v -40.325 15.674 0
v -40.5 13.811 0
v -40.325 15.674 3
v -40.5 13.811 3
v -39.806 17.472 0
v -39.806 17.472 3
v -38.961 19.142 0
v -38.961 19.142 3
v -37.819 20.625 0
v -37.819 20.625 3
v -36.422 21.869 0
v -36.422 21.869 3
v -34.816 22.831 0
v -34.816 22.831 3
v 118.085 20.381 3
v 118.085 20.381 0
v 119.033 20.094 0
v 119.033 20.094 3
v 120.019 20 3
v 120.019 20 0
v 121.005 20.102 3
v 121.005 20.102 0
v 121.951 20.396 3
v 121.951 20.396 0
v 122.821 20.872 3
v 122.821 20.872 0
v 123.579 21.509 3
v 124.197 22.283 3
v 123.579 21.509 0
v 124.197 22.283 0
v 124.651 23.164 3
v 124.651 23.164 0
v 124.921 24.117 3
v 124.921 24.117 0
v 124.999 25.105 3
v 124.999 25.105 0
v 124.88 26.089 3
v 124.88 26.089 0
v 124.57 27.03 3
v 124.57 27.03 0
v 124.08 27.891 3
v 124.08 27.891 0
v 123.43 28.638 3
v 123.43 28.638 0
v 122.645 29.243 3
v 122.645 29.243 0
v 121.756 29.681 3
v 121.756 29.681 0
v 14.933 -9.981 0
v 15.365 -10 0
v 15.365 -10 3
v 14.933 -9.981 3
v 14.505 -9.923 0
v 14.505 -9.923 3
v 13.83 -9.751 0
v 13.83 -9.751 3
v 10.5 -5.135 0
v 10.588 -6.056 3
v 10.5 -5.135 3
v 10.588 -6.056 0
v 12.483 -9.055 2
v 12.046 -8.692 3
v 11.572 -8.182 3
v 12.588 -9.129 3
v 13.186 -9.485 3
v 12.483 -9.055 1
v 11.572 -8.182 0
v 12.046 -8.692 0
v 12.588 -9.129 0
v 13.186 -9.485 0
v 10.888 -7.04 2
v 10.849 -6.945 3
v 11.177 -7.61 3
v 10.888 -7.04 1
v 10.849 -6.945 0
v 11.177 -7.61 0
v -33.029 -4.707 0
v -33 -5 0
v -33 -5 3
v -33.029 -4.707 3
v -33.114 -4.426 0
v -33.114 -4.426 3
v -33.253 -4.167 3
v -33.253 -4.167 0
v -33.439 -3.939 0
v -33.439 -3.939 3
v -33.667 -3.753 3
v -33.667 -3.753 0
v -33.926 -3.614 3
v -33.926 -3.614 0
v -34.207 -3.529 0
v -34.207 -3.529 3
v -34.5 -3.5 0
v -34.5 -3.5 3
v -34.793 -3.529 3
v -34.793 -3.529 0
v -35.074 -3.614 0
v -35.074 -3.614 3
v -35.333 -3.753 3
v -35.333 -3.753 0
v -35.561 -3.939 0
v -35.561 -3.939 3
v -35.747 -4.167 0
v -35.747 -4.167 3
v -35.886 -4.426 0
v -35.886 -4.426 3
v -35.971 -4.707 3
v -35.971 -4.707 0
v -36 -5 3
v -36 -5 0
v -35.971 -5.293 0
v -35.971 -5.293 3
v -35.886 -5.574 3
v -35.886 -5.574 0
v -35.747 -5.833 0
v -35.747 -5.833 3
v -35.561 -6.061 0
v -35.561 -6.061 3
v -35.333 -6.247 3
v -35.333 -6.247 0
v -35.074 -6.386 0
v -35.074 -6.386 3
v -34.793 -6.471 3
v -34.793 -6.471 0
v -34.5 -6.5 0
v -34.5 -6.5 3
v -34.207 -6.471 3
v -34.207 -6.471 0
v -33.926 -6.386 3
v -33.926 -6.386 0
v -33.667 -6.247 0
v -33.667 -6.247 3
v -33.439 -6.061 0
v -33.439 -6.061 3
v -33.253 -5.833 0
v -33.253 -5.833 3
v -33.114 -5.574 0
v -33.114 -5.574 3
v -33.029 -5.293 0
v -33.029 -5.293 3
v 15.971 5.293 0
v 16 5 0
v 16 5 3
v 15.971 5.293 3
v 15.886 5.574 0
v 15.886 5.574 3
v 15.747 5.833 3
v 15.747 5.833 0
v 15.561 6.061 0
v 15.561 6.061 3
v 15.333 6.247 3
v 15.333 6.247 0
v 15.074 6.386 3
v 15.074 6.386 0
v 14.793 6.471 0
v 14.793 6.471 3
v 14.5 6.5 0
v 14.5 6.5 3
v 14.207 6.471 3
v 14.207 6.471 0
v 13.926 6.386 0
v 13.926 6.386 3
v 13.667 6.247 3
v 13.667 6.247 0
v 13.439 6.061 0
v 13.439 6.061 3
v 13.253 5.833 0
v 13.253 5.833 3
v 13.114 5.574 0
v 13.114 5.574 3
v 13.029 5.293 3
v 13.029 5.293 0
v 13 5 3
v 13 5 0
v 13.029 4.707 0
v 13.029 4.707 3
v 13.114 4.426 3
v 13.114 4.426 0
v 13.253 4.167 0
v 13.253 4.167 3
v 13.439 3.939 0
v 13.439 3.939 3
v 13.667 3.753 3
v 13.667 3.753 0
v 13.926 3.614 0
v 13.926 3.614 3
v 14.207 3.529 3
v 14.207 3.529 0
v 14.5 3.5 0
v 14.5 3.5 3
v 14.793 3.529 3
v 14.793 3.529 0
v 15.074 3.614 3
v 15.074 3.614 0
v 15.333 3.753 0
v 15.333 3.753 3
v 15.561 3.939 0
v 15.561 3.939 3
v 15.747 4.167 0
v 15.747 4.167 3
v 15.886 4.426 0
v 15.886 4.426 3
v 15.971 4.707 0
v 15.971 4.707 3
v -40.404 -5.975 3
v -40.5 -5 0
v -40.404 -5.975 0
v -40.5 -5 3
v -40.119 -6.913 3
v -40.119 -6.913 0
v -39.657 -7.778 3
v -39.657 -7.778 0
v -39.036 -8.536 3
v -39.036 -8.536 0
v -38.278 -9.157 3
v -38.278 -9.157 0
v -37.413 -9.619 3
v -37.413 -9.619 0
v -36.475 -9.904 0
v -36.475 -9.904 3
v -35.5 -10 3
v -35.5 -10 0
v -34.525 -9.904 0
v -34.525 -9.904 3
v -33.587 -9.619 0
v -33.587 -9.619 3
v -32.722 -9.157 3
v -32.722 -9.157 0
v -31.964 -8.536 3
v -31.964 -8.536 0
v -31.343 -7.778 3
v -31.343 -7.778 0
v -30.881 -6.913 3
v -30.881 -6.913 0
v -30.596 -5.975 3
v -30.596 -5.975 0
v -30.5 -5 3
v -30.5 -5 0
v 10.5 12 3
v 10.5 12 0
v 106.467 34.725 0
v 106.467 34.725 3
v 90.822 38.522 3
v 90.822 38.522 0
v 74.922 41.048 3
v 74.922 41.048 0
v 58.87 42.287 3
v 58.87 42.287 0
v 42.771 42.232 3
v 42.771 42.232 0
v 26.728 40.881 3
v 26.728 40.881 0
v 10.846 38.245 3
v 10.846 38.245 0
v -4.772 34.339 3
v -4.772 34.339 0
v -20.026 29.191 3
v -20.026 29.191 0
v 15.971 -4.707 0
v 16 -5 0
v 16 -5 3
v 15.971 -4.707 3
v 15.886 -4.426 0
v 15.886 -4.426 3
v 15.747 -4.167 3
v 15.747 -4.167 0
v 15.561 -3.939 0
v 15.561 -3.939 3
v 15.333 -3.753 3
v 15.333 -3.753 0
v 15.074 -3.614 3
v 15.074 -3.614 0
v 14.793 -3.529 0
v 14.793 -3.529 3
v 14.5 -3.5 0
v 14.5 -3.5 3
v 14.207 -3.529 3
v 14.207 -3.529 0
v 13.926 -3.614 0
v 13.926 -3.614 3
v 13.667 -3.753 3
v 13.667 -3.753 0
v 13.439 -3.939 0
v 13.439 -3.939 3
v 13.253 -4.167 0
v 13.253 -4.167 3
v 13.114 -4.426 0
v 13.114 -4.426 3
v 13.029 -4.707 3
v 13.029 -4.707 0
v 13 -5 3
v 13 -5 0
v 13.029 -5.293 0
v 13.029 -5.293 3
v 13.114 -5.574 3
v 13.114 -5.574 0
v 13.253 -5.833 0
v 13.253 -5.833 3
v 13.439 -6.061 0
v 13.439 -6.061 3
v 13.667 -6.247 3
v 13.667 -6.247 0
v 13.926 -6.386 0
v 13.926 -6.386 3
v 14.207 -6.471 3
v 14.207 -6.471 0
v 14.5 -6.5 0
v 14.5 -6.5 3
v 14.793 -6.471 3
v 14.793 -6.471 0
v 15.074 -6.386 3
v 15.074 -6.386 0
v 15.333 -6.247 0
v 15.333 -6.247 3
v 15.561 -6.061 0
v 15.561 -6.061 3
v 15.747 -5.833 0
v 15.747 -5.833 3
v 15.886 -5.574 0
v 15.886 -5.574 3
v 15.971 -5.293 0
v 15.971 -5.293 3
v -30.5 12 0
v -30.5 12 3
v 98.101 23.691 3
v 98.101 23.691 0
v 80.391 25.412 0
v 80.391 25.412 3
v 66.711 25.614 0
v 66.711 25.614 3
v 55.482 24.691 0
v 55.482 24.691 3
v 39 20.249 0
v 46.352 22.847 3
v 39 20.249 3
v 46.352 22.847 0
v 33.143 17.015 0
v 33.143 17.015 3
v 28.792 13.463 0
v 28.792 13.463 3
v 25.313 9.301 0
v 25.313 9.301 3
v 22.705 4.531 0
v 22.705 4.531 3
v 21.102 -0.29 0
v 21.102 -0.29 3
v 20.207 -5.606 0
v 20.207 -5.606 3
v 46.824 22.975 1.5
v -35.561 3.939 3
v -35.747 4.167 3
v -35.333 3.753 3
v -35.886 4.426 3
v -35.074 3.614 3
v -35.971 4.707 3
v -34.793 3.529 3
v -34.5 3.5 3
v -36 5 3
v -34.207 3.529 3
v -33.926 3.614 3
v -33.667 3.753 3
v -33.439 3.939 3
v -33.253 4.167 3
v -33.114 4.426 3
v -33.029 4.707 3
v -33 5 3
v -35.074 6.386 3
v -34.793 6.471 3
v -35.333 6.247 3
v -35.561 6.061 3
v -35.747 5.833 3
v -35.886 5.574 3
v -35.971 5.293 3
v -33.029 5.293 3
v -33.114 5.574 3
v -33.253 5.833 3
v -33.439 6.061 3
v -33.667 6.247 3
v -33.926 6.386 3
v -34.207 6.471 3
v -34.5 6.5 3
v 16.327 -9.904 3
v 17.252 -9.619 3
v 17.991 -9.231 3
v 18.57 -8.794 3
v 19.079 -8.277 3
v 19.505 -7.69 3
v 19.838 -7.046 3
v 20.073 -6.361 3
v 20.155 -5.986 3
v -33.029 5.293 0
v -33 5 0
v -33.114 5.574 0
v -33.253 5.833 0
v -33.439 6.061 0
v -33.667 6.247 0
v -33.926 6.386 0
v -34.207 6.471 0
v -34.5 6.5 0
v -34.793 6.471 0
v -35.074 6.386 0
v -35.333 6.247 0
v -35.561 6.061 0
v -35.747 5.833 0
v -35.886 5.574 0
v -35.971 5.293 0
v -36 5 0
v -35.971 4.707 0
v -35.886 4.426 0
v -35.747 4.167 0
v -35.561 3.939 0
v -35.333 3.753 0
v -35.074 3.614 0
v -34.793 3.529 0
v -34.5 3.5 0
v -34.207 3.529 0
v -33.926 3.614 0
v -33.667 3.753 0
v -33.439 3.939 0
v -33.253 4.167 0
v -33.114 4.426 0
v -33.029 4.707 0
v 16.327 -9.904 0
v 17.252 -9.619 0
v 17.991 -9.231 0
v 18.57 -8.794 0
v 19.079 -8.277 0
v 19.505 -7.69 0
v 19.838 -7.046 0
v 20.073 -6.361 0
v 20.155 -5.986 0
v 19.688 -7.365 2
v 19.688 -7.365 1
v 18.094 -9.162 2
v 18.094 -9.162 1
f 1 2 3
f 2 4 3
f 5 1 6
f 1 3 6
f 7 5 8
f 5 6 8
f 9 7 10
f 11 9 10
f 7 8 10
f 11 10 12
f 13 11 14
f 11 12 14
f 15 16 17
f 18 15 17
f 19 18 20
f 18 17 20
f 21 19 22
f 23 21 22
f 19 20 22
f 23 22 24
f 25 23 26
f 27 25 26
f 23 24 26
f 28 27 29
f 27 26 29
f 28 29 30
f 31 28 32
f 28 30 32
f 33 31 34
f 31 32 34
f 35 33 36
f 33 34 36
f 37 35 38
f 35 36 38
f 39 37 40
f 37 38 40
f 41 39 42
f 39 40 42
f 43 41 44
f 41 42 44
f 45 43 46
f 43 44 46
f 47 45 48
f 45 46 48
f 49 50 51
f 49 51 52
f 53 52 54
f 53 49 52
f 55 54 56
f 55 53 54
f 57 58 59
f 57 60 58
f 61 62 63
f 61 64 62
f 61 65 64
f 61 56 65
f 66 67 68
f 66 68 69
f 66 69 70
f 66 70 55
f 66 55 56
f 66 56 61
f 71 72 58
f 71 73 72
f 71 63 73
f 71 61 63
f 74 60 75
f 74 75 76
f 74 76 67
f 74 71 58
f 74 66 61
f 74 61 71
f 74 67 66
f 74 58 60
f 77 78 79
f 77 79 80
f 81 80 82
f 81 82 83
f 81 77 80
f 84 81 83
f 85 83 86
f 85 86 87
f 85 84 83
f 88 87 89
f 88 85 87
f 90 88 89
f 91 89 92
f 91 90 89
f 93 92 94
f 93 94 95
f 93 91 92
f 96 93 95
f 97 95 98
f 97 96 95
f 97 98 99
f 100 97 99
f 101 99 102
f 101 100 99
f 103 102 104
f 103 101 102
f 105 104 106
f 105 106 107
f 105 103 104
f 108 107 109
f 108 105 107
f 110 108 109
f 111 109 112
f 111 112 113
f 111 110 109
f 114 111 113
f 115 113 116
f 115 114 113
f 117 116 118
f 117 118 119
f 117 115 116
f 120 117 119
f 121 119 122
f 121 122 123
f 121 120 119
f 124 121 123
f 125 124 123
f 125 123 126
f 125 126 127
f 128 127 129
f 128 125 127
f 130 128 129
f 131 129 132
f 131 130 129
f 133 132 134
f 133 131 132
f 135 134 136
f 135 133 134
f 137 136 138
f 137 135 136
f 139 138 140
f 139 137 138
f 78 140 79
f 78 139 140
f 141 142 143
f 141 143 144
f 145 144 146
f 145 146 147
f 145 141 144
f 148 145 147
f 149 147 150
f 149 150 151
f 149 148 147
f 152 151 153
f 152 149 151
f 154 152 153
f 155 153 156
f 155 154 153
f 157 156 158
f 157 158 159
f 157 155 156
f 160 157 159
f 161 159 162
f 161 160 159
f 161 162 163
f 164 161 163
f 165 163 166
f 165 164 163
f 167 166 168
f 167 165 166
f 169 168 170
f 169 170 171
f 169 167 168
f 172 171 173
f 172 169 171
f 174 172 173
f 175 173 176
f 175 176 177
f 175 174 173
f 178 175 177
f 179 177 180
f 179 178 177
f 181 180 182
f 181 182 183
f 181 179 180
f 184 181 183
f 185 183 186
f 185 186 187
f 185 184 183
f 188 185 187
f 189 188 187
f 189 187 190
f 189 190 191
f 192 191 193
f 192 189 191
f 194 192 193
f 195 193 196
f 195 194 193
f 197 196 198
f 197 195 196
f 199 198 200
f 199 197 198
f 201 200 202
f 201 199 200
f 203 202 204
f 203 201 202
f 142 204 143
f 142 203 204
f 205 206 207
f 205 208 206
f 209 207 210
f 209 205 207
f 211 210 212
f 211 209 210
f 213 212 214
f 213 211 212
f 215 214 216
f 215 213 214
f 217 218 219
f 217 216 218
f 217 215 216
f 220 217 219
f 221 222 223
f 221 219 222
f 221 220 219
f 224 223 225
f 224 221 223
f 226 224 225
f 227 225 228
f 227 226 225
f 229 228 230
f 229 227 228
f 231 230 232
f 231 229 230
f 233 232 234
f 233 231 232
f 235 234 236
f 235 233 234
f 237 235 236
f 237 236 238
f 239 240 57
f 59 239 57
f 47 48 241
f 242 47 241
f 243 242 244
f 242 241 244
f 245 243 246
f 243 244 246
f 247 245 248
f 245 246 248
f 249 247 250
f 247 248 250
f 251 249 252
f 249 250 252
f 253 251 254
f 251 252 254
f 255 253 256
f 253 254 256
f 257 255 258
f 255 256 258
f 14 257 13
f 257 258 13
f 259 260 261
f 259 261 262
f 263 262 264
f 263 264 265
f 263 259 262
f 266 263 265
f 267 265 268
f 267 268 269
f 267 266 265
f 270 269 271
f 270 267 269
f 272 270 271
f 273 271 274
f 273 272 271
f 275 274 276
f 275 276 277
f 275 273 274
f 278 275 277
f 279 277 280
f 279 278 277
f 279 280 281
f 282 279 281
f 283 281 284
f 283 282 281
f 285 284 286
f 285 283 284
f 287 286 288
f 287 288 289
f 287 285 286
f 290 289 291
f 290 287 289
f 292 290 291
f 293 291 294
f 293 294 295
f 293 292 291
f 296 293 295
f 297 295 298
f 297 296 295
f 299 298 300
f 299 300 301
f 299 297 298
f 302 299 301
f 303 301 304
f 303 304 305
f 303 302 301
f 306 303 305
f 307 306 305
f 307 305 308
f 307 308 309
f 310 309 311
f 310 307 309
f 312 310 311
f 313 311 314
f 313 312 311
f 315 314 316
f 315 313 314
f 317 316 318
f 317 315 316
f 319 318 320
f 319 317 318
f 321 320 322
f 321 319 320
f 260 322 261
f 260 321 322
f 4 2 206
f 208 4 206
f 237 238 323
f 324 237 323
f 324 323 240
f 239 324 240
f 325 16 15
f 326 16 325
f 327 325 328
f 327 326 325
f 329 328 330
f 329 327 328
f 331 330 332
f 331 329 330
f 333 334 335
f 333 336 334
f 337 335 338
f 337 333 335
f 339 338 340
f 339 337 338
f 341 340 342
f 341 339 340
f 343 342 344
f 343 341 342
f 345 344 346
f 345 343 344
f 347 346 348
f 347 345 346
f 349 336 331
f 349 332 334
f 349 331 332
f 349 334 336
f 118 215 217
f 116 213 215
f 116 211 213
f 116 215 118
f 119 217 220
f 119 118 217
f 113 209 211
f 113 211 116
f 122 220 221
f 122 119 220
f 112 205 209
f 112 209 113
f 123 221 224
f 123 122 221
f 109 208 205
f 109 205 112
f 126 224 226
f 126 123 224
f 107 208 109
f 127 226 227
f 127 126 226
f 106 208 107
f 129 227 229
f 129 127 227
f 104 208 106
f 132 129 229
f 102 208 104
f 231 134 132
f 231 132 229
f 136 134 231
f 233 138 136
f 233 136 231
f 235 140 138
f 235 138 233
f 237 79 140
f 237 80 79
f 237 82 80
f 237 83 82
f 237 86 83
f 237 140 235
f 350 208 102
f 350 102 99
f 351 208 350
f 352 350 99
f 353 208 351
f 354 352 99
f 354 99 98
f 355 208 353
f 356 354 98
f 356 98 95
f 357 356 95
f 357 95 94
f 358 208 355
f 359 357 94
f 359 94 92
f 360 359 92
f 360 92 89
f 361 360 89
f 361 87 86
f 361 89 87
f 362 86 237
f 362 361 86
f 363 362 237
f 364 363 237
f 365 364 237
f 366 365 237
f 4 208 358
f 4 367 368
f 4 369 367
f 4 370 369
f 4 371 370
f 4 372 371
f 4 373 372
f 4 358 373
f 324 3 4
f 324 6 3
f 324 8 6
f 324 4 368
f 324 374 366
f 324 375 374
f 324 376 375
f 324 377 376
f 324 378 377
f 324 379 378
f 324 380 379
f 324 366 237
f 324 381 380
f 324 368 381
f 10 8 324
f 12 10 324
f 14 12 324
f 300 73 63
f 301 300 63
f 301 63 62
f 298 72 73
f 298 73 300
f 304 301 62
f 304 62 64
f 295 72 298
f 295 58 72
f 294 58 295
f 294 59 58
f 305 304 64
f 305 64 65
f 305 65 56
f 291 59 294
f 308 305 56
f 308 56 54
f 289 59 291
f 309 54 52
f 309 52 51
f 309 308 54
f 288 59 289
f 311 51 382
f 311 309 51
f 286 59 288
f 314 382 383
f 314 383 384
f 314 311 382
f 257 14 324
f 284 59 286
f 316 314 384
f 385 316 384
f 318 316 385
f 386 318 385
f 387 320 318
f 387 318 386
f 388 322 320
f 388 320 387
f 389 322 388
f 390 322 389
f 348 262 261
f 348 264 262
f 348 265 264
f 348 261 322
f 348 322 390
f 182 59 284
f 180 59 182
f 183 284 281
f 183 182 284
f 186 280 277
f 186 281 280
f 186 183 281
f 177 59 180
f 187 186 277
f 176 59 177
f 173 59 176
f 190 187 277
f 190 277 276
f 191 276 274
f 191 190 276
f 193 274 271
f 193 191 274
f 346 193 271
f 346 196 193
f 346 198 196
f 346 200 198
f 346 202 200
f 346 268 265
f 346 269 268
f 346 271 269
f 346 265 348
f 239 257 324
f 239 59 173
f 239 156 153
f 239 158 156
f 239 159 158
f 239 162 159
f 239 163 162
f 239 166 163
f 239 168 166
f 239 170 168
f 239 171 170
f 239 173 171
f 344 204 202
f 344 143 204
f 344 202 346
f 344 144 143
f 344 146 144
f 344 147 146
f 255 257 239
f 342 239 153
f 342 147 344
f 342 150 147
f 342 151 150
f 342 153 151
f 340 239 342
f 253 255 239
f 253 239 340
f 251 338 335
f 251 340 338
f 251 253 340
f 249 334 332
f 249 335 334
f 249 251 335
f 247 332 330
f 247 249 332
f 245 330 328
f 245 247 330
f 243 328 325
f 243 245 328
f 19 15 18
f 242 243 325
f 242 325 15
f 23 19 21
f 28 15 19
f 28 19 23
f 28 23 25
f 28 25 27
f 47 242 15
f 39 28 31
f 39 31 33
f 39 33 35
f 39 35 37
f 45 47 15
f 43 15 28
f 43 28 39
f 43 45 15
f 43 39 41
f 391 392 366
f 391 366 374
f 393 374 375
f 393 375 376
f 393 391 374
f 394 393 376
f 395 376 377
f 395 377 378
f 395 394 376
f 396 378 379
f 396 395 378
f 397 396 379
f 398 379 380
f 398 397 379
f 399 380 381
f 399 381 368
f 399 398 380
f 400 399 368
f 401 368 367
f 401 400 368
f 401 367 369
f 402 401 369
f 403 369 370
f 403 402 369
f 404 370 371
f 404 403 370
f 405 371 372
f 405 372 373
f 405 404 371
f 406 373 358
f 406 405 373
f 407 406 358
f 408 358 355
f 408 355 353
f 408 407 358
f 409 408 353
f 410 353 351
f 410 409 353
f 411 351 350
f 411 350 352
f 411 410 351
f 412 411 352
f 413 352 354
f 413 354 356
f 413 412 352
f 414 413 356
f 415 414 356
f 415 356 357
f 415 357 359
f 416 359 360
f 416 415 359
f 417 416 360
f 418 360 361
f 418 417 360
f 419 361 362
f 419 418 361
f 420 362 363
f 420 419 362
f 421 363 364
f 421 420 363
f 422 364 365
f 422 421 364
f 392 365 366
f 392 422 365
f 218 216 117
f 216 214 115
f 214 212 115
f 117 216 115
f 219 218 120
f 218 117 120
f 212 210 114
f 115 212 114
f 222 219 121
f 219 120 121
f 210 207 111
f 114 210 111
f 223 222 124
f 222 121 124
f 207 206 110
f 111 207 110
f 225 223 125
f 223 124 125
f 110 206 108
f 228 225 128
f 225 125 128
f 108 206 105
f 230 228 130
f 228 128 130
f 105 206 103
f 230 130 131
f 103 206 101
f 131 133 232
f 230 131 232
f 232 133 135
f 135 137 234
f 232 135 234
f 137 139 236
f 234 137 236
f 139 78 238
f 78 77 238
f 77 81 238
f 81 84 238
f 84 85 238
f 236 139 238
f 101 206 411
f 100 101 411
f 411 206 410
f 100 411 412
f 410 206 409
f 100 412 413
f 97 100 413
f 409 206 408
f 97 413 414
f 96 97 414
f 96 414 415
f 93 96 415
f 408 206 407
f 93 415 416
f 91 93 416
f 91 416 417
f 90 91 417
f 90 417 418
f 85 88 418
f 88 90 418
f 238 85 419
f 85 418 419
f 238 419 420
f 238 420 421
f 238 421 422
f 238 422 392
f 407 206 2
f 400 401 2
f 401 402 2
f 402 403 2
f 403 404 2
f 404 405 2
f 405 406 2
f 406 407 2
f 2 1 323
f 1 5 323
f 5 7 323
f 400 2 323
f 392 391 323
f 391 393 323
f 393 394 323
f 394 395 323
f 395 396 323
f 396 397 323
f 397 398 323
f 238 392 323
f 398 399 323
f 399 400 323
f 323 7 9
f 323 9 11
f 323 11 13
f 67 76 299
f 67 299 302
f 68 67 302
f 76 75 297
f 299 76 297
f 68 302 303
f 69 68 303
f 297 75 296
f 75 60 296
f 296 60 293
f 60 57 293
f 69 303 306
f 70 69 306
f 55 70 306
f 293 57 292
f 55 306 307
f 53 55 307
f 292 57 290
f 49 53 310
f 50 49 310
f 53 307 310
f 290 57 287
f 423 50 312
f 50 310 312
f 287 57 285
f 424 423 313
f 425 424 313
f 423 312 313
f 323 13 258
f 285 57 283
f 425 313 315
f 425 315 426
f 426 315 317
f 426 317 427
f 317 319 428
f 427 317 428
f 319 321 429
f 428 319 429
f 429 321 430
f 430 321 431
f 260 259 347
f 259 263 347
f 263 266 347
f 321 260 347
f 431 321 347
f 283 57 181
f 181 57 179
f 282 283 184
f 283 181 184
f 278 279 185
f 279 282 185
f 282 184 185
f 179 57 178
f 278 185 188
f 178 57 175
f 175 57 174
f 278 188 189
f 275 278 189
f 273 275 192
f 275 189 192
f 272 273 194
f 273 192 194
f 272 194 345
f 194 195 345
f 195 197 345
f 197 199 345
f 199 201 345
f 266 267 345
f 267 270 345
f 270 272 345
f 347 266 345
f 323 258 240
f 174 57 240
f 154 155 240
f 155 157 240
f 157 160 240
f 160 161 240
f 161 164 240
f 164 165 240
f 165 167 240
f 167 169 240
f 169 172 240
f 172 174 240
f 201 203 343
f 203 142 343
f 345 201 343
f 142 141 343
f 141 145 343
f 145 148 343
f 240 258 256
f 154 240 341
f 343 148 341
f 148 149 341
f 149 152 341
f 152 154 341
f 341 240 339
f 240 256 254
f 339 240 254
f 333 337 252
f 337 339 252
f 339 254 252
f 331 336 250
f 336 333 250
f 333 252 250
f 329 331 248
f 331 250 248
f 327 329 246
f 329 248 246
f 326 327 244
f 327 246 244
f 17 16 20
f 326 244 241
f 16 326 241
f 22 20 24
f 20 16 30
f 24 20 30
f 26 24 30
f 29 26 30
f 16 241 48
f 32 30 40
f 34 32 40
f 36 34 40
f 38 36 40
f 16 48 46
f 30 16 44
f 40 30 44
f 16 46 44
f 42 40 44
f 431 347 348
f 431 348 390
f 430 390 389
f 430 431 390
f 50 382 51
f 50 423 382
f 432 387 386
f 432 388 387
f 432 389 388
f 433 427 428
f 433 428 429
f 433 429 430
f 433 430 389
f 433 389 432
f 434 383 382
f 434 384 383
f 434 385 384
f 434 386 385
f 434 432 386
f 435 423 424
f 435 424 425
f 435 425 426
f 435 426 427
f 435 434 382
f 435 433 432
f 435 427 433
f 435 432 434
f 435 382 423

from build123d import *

# Parameters (mm, degrees)
SKETCH1_R           = 1.5
BOSS_EXTRUDE1_DEPTH = 3
FILLET1_R           = 10
FILLET2_START       = -1
FILLET2_DEPTH       = 5
FILLET3_RADIUS      = 5
FILLET3_LENGTH      = 3


with BuildPart() as part:
    # Sketch1 → Boss-Extrude1 (new body)
    with BuildSketch(Plane.XY):
        with BuildLine():
            Line((-40.5, 20), (-40.5, -10))
            Line((-40.5, -10), (-30.5, -10))
            Line((-30.5, -10), (-30.5, 12))
            Line((-30.5, 12), (10.5, 12))
            Line((10.5, 12), (10.5, -10))
            Line((10.5, -10), (20, -10))
            add(Edge.make_bspline(
                [(118.084820575, 20.381332685), (20, 39.436163422), (20, -10)],
                knots=[0, 0, 0, 1, 1, 1], degree=2))
            ThreePointArc((118.084820575, 20.381332685), (124.650748454, 23.164097275), (121.756088913, 29.681468971))
            ThreePointArc((121.756088913, 29.681468971), (39.600152782, 42.067632947), (-40.5, 20))
        make_face()
        with Locations((-34.5, -5)):
            Circle(SKETCH1_R, mode=Mode.SUBTRACT)
        with Locations((-34.5, 5)):
            Circle(SKETCH1_R, mode=Mode.SUBTRACT)
        with Locations((14.5, 5)):
            Circle(SKETCH1_R, mode=Mode.SUBTRACT)
        with Locations((14.5, -5)):
            Circle(SKETCH1_R, mode=Mode.SUBTRACT)
    extrude(amount=BOSS_EXTRUDE1_DEPTH)

    # Fillet1
    fillet1_edges = [part.edges().sort_by_distance(p)[0] for p in [
        (-40.5, 20, 1.5),
    ]]
    fillet(fillet1_edges, radius=FILLET1_R)

    # Fillet2: read off the stored shape, not the designer's step
    # Fillet2 outline → Fillet2 (cut)
    with BuildSketch(Plane.XY.offset(FILLET2_START)):
        with BuildLine():
            add(Edge.make_bspline(
                [(20, -10), (20, -7.730924257), (20.206638038, -5.606140409)],
                knots=[0, 0, 0, 0.045899107, 0.045899107, 0.045899107], degree=2))
            add(Edge.make_bspline(
                [(20.206638038, -5.606140409), (19.985493057, -7.880093874), (18.329539971, -9.999999869), (15.36474074, -10)],
                knots=[0, 0, 0, 0, 0.487277065, 0.487277065, 0.487277065, 0.487277065], degree=3, weights=[1, 0.690889052, 0.53240078, 0.524535183]))
            Line((15.36474074, -10), (20, -10))
        make_face()
        with BuildLine():
            Line((10.5, -10), (15.36474074, -10))
            add(Edge.make_bspline(
                [(15.36474074, -10), (12.147576418, -10.000000142), (10.5, -7.59675874), (10.5, -5.135259475)],
                knots=[0.487277065, 0.487277065, 0.487277065, 0.487277065, 1, 1, 1, 1], degree=3, weights=[0.524535183, 0.51625884, 0.674747113, 1]))
            Line((10.5, -5.135259475), (10.5, -10))
        make_face()
    extrude(amount=FILLET2_DEPTH, mode=Mode.SUBTRACT)

    # Fillet3: full round fillet: the end face becomes a half cylinder, R = half its width
    fillet3_face = Plane((-35.5, -10, 1.5), x_dir=(0, 0, 1), z_dir=(0, -1, 0))  # on the end face: x along it, z out of the body
    fillet3_slab = fillet3_face.offset(-FILLET3_RADIUS / 2) * Box(FILLET3_LENGTH, 2 * FILLET3_RADIUS, FILLET3_RADIUS, mode=Mode.PRIVATE)  # the body's end, R deep
    fillet3_round = Plane((-35.5, -5, 1.5), x_dir=(0, -1, 0), z_dir=(0, 0, 1)) * Cylinder(FILLET3_RADIUS, FILLET3_LENGTH, mode=Mode.PRIVATE)  # its axis R under the face
    add(fillet3_slab - fillet3_round, mode=Mode.SUBTRACT)


solid = part.part
